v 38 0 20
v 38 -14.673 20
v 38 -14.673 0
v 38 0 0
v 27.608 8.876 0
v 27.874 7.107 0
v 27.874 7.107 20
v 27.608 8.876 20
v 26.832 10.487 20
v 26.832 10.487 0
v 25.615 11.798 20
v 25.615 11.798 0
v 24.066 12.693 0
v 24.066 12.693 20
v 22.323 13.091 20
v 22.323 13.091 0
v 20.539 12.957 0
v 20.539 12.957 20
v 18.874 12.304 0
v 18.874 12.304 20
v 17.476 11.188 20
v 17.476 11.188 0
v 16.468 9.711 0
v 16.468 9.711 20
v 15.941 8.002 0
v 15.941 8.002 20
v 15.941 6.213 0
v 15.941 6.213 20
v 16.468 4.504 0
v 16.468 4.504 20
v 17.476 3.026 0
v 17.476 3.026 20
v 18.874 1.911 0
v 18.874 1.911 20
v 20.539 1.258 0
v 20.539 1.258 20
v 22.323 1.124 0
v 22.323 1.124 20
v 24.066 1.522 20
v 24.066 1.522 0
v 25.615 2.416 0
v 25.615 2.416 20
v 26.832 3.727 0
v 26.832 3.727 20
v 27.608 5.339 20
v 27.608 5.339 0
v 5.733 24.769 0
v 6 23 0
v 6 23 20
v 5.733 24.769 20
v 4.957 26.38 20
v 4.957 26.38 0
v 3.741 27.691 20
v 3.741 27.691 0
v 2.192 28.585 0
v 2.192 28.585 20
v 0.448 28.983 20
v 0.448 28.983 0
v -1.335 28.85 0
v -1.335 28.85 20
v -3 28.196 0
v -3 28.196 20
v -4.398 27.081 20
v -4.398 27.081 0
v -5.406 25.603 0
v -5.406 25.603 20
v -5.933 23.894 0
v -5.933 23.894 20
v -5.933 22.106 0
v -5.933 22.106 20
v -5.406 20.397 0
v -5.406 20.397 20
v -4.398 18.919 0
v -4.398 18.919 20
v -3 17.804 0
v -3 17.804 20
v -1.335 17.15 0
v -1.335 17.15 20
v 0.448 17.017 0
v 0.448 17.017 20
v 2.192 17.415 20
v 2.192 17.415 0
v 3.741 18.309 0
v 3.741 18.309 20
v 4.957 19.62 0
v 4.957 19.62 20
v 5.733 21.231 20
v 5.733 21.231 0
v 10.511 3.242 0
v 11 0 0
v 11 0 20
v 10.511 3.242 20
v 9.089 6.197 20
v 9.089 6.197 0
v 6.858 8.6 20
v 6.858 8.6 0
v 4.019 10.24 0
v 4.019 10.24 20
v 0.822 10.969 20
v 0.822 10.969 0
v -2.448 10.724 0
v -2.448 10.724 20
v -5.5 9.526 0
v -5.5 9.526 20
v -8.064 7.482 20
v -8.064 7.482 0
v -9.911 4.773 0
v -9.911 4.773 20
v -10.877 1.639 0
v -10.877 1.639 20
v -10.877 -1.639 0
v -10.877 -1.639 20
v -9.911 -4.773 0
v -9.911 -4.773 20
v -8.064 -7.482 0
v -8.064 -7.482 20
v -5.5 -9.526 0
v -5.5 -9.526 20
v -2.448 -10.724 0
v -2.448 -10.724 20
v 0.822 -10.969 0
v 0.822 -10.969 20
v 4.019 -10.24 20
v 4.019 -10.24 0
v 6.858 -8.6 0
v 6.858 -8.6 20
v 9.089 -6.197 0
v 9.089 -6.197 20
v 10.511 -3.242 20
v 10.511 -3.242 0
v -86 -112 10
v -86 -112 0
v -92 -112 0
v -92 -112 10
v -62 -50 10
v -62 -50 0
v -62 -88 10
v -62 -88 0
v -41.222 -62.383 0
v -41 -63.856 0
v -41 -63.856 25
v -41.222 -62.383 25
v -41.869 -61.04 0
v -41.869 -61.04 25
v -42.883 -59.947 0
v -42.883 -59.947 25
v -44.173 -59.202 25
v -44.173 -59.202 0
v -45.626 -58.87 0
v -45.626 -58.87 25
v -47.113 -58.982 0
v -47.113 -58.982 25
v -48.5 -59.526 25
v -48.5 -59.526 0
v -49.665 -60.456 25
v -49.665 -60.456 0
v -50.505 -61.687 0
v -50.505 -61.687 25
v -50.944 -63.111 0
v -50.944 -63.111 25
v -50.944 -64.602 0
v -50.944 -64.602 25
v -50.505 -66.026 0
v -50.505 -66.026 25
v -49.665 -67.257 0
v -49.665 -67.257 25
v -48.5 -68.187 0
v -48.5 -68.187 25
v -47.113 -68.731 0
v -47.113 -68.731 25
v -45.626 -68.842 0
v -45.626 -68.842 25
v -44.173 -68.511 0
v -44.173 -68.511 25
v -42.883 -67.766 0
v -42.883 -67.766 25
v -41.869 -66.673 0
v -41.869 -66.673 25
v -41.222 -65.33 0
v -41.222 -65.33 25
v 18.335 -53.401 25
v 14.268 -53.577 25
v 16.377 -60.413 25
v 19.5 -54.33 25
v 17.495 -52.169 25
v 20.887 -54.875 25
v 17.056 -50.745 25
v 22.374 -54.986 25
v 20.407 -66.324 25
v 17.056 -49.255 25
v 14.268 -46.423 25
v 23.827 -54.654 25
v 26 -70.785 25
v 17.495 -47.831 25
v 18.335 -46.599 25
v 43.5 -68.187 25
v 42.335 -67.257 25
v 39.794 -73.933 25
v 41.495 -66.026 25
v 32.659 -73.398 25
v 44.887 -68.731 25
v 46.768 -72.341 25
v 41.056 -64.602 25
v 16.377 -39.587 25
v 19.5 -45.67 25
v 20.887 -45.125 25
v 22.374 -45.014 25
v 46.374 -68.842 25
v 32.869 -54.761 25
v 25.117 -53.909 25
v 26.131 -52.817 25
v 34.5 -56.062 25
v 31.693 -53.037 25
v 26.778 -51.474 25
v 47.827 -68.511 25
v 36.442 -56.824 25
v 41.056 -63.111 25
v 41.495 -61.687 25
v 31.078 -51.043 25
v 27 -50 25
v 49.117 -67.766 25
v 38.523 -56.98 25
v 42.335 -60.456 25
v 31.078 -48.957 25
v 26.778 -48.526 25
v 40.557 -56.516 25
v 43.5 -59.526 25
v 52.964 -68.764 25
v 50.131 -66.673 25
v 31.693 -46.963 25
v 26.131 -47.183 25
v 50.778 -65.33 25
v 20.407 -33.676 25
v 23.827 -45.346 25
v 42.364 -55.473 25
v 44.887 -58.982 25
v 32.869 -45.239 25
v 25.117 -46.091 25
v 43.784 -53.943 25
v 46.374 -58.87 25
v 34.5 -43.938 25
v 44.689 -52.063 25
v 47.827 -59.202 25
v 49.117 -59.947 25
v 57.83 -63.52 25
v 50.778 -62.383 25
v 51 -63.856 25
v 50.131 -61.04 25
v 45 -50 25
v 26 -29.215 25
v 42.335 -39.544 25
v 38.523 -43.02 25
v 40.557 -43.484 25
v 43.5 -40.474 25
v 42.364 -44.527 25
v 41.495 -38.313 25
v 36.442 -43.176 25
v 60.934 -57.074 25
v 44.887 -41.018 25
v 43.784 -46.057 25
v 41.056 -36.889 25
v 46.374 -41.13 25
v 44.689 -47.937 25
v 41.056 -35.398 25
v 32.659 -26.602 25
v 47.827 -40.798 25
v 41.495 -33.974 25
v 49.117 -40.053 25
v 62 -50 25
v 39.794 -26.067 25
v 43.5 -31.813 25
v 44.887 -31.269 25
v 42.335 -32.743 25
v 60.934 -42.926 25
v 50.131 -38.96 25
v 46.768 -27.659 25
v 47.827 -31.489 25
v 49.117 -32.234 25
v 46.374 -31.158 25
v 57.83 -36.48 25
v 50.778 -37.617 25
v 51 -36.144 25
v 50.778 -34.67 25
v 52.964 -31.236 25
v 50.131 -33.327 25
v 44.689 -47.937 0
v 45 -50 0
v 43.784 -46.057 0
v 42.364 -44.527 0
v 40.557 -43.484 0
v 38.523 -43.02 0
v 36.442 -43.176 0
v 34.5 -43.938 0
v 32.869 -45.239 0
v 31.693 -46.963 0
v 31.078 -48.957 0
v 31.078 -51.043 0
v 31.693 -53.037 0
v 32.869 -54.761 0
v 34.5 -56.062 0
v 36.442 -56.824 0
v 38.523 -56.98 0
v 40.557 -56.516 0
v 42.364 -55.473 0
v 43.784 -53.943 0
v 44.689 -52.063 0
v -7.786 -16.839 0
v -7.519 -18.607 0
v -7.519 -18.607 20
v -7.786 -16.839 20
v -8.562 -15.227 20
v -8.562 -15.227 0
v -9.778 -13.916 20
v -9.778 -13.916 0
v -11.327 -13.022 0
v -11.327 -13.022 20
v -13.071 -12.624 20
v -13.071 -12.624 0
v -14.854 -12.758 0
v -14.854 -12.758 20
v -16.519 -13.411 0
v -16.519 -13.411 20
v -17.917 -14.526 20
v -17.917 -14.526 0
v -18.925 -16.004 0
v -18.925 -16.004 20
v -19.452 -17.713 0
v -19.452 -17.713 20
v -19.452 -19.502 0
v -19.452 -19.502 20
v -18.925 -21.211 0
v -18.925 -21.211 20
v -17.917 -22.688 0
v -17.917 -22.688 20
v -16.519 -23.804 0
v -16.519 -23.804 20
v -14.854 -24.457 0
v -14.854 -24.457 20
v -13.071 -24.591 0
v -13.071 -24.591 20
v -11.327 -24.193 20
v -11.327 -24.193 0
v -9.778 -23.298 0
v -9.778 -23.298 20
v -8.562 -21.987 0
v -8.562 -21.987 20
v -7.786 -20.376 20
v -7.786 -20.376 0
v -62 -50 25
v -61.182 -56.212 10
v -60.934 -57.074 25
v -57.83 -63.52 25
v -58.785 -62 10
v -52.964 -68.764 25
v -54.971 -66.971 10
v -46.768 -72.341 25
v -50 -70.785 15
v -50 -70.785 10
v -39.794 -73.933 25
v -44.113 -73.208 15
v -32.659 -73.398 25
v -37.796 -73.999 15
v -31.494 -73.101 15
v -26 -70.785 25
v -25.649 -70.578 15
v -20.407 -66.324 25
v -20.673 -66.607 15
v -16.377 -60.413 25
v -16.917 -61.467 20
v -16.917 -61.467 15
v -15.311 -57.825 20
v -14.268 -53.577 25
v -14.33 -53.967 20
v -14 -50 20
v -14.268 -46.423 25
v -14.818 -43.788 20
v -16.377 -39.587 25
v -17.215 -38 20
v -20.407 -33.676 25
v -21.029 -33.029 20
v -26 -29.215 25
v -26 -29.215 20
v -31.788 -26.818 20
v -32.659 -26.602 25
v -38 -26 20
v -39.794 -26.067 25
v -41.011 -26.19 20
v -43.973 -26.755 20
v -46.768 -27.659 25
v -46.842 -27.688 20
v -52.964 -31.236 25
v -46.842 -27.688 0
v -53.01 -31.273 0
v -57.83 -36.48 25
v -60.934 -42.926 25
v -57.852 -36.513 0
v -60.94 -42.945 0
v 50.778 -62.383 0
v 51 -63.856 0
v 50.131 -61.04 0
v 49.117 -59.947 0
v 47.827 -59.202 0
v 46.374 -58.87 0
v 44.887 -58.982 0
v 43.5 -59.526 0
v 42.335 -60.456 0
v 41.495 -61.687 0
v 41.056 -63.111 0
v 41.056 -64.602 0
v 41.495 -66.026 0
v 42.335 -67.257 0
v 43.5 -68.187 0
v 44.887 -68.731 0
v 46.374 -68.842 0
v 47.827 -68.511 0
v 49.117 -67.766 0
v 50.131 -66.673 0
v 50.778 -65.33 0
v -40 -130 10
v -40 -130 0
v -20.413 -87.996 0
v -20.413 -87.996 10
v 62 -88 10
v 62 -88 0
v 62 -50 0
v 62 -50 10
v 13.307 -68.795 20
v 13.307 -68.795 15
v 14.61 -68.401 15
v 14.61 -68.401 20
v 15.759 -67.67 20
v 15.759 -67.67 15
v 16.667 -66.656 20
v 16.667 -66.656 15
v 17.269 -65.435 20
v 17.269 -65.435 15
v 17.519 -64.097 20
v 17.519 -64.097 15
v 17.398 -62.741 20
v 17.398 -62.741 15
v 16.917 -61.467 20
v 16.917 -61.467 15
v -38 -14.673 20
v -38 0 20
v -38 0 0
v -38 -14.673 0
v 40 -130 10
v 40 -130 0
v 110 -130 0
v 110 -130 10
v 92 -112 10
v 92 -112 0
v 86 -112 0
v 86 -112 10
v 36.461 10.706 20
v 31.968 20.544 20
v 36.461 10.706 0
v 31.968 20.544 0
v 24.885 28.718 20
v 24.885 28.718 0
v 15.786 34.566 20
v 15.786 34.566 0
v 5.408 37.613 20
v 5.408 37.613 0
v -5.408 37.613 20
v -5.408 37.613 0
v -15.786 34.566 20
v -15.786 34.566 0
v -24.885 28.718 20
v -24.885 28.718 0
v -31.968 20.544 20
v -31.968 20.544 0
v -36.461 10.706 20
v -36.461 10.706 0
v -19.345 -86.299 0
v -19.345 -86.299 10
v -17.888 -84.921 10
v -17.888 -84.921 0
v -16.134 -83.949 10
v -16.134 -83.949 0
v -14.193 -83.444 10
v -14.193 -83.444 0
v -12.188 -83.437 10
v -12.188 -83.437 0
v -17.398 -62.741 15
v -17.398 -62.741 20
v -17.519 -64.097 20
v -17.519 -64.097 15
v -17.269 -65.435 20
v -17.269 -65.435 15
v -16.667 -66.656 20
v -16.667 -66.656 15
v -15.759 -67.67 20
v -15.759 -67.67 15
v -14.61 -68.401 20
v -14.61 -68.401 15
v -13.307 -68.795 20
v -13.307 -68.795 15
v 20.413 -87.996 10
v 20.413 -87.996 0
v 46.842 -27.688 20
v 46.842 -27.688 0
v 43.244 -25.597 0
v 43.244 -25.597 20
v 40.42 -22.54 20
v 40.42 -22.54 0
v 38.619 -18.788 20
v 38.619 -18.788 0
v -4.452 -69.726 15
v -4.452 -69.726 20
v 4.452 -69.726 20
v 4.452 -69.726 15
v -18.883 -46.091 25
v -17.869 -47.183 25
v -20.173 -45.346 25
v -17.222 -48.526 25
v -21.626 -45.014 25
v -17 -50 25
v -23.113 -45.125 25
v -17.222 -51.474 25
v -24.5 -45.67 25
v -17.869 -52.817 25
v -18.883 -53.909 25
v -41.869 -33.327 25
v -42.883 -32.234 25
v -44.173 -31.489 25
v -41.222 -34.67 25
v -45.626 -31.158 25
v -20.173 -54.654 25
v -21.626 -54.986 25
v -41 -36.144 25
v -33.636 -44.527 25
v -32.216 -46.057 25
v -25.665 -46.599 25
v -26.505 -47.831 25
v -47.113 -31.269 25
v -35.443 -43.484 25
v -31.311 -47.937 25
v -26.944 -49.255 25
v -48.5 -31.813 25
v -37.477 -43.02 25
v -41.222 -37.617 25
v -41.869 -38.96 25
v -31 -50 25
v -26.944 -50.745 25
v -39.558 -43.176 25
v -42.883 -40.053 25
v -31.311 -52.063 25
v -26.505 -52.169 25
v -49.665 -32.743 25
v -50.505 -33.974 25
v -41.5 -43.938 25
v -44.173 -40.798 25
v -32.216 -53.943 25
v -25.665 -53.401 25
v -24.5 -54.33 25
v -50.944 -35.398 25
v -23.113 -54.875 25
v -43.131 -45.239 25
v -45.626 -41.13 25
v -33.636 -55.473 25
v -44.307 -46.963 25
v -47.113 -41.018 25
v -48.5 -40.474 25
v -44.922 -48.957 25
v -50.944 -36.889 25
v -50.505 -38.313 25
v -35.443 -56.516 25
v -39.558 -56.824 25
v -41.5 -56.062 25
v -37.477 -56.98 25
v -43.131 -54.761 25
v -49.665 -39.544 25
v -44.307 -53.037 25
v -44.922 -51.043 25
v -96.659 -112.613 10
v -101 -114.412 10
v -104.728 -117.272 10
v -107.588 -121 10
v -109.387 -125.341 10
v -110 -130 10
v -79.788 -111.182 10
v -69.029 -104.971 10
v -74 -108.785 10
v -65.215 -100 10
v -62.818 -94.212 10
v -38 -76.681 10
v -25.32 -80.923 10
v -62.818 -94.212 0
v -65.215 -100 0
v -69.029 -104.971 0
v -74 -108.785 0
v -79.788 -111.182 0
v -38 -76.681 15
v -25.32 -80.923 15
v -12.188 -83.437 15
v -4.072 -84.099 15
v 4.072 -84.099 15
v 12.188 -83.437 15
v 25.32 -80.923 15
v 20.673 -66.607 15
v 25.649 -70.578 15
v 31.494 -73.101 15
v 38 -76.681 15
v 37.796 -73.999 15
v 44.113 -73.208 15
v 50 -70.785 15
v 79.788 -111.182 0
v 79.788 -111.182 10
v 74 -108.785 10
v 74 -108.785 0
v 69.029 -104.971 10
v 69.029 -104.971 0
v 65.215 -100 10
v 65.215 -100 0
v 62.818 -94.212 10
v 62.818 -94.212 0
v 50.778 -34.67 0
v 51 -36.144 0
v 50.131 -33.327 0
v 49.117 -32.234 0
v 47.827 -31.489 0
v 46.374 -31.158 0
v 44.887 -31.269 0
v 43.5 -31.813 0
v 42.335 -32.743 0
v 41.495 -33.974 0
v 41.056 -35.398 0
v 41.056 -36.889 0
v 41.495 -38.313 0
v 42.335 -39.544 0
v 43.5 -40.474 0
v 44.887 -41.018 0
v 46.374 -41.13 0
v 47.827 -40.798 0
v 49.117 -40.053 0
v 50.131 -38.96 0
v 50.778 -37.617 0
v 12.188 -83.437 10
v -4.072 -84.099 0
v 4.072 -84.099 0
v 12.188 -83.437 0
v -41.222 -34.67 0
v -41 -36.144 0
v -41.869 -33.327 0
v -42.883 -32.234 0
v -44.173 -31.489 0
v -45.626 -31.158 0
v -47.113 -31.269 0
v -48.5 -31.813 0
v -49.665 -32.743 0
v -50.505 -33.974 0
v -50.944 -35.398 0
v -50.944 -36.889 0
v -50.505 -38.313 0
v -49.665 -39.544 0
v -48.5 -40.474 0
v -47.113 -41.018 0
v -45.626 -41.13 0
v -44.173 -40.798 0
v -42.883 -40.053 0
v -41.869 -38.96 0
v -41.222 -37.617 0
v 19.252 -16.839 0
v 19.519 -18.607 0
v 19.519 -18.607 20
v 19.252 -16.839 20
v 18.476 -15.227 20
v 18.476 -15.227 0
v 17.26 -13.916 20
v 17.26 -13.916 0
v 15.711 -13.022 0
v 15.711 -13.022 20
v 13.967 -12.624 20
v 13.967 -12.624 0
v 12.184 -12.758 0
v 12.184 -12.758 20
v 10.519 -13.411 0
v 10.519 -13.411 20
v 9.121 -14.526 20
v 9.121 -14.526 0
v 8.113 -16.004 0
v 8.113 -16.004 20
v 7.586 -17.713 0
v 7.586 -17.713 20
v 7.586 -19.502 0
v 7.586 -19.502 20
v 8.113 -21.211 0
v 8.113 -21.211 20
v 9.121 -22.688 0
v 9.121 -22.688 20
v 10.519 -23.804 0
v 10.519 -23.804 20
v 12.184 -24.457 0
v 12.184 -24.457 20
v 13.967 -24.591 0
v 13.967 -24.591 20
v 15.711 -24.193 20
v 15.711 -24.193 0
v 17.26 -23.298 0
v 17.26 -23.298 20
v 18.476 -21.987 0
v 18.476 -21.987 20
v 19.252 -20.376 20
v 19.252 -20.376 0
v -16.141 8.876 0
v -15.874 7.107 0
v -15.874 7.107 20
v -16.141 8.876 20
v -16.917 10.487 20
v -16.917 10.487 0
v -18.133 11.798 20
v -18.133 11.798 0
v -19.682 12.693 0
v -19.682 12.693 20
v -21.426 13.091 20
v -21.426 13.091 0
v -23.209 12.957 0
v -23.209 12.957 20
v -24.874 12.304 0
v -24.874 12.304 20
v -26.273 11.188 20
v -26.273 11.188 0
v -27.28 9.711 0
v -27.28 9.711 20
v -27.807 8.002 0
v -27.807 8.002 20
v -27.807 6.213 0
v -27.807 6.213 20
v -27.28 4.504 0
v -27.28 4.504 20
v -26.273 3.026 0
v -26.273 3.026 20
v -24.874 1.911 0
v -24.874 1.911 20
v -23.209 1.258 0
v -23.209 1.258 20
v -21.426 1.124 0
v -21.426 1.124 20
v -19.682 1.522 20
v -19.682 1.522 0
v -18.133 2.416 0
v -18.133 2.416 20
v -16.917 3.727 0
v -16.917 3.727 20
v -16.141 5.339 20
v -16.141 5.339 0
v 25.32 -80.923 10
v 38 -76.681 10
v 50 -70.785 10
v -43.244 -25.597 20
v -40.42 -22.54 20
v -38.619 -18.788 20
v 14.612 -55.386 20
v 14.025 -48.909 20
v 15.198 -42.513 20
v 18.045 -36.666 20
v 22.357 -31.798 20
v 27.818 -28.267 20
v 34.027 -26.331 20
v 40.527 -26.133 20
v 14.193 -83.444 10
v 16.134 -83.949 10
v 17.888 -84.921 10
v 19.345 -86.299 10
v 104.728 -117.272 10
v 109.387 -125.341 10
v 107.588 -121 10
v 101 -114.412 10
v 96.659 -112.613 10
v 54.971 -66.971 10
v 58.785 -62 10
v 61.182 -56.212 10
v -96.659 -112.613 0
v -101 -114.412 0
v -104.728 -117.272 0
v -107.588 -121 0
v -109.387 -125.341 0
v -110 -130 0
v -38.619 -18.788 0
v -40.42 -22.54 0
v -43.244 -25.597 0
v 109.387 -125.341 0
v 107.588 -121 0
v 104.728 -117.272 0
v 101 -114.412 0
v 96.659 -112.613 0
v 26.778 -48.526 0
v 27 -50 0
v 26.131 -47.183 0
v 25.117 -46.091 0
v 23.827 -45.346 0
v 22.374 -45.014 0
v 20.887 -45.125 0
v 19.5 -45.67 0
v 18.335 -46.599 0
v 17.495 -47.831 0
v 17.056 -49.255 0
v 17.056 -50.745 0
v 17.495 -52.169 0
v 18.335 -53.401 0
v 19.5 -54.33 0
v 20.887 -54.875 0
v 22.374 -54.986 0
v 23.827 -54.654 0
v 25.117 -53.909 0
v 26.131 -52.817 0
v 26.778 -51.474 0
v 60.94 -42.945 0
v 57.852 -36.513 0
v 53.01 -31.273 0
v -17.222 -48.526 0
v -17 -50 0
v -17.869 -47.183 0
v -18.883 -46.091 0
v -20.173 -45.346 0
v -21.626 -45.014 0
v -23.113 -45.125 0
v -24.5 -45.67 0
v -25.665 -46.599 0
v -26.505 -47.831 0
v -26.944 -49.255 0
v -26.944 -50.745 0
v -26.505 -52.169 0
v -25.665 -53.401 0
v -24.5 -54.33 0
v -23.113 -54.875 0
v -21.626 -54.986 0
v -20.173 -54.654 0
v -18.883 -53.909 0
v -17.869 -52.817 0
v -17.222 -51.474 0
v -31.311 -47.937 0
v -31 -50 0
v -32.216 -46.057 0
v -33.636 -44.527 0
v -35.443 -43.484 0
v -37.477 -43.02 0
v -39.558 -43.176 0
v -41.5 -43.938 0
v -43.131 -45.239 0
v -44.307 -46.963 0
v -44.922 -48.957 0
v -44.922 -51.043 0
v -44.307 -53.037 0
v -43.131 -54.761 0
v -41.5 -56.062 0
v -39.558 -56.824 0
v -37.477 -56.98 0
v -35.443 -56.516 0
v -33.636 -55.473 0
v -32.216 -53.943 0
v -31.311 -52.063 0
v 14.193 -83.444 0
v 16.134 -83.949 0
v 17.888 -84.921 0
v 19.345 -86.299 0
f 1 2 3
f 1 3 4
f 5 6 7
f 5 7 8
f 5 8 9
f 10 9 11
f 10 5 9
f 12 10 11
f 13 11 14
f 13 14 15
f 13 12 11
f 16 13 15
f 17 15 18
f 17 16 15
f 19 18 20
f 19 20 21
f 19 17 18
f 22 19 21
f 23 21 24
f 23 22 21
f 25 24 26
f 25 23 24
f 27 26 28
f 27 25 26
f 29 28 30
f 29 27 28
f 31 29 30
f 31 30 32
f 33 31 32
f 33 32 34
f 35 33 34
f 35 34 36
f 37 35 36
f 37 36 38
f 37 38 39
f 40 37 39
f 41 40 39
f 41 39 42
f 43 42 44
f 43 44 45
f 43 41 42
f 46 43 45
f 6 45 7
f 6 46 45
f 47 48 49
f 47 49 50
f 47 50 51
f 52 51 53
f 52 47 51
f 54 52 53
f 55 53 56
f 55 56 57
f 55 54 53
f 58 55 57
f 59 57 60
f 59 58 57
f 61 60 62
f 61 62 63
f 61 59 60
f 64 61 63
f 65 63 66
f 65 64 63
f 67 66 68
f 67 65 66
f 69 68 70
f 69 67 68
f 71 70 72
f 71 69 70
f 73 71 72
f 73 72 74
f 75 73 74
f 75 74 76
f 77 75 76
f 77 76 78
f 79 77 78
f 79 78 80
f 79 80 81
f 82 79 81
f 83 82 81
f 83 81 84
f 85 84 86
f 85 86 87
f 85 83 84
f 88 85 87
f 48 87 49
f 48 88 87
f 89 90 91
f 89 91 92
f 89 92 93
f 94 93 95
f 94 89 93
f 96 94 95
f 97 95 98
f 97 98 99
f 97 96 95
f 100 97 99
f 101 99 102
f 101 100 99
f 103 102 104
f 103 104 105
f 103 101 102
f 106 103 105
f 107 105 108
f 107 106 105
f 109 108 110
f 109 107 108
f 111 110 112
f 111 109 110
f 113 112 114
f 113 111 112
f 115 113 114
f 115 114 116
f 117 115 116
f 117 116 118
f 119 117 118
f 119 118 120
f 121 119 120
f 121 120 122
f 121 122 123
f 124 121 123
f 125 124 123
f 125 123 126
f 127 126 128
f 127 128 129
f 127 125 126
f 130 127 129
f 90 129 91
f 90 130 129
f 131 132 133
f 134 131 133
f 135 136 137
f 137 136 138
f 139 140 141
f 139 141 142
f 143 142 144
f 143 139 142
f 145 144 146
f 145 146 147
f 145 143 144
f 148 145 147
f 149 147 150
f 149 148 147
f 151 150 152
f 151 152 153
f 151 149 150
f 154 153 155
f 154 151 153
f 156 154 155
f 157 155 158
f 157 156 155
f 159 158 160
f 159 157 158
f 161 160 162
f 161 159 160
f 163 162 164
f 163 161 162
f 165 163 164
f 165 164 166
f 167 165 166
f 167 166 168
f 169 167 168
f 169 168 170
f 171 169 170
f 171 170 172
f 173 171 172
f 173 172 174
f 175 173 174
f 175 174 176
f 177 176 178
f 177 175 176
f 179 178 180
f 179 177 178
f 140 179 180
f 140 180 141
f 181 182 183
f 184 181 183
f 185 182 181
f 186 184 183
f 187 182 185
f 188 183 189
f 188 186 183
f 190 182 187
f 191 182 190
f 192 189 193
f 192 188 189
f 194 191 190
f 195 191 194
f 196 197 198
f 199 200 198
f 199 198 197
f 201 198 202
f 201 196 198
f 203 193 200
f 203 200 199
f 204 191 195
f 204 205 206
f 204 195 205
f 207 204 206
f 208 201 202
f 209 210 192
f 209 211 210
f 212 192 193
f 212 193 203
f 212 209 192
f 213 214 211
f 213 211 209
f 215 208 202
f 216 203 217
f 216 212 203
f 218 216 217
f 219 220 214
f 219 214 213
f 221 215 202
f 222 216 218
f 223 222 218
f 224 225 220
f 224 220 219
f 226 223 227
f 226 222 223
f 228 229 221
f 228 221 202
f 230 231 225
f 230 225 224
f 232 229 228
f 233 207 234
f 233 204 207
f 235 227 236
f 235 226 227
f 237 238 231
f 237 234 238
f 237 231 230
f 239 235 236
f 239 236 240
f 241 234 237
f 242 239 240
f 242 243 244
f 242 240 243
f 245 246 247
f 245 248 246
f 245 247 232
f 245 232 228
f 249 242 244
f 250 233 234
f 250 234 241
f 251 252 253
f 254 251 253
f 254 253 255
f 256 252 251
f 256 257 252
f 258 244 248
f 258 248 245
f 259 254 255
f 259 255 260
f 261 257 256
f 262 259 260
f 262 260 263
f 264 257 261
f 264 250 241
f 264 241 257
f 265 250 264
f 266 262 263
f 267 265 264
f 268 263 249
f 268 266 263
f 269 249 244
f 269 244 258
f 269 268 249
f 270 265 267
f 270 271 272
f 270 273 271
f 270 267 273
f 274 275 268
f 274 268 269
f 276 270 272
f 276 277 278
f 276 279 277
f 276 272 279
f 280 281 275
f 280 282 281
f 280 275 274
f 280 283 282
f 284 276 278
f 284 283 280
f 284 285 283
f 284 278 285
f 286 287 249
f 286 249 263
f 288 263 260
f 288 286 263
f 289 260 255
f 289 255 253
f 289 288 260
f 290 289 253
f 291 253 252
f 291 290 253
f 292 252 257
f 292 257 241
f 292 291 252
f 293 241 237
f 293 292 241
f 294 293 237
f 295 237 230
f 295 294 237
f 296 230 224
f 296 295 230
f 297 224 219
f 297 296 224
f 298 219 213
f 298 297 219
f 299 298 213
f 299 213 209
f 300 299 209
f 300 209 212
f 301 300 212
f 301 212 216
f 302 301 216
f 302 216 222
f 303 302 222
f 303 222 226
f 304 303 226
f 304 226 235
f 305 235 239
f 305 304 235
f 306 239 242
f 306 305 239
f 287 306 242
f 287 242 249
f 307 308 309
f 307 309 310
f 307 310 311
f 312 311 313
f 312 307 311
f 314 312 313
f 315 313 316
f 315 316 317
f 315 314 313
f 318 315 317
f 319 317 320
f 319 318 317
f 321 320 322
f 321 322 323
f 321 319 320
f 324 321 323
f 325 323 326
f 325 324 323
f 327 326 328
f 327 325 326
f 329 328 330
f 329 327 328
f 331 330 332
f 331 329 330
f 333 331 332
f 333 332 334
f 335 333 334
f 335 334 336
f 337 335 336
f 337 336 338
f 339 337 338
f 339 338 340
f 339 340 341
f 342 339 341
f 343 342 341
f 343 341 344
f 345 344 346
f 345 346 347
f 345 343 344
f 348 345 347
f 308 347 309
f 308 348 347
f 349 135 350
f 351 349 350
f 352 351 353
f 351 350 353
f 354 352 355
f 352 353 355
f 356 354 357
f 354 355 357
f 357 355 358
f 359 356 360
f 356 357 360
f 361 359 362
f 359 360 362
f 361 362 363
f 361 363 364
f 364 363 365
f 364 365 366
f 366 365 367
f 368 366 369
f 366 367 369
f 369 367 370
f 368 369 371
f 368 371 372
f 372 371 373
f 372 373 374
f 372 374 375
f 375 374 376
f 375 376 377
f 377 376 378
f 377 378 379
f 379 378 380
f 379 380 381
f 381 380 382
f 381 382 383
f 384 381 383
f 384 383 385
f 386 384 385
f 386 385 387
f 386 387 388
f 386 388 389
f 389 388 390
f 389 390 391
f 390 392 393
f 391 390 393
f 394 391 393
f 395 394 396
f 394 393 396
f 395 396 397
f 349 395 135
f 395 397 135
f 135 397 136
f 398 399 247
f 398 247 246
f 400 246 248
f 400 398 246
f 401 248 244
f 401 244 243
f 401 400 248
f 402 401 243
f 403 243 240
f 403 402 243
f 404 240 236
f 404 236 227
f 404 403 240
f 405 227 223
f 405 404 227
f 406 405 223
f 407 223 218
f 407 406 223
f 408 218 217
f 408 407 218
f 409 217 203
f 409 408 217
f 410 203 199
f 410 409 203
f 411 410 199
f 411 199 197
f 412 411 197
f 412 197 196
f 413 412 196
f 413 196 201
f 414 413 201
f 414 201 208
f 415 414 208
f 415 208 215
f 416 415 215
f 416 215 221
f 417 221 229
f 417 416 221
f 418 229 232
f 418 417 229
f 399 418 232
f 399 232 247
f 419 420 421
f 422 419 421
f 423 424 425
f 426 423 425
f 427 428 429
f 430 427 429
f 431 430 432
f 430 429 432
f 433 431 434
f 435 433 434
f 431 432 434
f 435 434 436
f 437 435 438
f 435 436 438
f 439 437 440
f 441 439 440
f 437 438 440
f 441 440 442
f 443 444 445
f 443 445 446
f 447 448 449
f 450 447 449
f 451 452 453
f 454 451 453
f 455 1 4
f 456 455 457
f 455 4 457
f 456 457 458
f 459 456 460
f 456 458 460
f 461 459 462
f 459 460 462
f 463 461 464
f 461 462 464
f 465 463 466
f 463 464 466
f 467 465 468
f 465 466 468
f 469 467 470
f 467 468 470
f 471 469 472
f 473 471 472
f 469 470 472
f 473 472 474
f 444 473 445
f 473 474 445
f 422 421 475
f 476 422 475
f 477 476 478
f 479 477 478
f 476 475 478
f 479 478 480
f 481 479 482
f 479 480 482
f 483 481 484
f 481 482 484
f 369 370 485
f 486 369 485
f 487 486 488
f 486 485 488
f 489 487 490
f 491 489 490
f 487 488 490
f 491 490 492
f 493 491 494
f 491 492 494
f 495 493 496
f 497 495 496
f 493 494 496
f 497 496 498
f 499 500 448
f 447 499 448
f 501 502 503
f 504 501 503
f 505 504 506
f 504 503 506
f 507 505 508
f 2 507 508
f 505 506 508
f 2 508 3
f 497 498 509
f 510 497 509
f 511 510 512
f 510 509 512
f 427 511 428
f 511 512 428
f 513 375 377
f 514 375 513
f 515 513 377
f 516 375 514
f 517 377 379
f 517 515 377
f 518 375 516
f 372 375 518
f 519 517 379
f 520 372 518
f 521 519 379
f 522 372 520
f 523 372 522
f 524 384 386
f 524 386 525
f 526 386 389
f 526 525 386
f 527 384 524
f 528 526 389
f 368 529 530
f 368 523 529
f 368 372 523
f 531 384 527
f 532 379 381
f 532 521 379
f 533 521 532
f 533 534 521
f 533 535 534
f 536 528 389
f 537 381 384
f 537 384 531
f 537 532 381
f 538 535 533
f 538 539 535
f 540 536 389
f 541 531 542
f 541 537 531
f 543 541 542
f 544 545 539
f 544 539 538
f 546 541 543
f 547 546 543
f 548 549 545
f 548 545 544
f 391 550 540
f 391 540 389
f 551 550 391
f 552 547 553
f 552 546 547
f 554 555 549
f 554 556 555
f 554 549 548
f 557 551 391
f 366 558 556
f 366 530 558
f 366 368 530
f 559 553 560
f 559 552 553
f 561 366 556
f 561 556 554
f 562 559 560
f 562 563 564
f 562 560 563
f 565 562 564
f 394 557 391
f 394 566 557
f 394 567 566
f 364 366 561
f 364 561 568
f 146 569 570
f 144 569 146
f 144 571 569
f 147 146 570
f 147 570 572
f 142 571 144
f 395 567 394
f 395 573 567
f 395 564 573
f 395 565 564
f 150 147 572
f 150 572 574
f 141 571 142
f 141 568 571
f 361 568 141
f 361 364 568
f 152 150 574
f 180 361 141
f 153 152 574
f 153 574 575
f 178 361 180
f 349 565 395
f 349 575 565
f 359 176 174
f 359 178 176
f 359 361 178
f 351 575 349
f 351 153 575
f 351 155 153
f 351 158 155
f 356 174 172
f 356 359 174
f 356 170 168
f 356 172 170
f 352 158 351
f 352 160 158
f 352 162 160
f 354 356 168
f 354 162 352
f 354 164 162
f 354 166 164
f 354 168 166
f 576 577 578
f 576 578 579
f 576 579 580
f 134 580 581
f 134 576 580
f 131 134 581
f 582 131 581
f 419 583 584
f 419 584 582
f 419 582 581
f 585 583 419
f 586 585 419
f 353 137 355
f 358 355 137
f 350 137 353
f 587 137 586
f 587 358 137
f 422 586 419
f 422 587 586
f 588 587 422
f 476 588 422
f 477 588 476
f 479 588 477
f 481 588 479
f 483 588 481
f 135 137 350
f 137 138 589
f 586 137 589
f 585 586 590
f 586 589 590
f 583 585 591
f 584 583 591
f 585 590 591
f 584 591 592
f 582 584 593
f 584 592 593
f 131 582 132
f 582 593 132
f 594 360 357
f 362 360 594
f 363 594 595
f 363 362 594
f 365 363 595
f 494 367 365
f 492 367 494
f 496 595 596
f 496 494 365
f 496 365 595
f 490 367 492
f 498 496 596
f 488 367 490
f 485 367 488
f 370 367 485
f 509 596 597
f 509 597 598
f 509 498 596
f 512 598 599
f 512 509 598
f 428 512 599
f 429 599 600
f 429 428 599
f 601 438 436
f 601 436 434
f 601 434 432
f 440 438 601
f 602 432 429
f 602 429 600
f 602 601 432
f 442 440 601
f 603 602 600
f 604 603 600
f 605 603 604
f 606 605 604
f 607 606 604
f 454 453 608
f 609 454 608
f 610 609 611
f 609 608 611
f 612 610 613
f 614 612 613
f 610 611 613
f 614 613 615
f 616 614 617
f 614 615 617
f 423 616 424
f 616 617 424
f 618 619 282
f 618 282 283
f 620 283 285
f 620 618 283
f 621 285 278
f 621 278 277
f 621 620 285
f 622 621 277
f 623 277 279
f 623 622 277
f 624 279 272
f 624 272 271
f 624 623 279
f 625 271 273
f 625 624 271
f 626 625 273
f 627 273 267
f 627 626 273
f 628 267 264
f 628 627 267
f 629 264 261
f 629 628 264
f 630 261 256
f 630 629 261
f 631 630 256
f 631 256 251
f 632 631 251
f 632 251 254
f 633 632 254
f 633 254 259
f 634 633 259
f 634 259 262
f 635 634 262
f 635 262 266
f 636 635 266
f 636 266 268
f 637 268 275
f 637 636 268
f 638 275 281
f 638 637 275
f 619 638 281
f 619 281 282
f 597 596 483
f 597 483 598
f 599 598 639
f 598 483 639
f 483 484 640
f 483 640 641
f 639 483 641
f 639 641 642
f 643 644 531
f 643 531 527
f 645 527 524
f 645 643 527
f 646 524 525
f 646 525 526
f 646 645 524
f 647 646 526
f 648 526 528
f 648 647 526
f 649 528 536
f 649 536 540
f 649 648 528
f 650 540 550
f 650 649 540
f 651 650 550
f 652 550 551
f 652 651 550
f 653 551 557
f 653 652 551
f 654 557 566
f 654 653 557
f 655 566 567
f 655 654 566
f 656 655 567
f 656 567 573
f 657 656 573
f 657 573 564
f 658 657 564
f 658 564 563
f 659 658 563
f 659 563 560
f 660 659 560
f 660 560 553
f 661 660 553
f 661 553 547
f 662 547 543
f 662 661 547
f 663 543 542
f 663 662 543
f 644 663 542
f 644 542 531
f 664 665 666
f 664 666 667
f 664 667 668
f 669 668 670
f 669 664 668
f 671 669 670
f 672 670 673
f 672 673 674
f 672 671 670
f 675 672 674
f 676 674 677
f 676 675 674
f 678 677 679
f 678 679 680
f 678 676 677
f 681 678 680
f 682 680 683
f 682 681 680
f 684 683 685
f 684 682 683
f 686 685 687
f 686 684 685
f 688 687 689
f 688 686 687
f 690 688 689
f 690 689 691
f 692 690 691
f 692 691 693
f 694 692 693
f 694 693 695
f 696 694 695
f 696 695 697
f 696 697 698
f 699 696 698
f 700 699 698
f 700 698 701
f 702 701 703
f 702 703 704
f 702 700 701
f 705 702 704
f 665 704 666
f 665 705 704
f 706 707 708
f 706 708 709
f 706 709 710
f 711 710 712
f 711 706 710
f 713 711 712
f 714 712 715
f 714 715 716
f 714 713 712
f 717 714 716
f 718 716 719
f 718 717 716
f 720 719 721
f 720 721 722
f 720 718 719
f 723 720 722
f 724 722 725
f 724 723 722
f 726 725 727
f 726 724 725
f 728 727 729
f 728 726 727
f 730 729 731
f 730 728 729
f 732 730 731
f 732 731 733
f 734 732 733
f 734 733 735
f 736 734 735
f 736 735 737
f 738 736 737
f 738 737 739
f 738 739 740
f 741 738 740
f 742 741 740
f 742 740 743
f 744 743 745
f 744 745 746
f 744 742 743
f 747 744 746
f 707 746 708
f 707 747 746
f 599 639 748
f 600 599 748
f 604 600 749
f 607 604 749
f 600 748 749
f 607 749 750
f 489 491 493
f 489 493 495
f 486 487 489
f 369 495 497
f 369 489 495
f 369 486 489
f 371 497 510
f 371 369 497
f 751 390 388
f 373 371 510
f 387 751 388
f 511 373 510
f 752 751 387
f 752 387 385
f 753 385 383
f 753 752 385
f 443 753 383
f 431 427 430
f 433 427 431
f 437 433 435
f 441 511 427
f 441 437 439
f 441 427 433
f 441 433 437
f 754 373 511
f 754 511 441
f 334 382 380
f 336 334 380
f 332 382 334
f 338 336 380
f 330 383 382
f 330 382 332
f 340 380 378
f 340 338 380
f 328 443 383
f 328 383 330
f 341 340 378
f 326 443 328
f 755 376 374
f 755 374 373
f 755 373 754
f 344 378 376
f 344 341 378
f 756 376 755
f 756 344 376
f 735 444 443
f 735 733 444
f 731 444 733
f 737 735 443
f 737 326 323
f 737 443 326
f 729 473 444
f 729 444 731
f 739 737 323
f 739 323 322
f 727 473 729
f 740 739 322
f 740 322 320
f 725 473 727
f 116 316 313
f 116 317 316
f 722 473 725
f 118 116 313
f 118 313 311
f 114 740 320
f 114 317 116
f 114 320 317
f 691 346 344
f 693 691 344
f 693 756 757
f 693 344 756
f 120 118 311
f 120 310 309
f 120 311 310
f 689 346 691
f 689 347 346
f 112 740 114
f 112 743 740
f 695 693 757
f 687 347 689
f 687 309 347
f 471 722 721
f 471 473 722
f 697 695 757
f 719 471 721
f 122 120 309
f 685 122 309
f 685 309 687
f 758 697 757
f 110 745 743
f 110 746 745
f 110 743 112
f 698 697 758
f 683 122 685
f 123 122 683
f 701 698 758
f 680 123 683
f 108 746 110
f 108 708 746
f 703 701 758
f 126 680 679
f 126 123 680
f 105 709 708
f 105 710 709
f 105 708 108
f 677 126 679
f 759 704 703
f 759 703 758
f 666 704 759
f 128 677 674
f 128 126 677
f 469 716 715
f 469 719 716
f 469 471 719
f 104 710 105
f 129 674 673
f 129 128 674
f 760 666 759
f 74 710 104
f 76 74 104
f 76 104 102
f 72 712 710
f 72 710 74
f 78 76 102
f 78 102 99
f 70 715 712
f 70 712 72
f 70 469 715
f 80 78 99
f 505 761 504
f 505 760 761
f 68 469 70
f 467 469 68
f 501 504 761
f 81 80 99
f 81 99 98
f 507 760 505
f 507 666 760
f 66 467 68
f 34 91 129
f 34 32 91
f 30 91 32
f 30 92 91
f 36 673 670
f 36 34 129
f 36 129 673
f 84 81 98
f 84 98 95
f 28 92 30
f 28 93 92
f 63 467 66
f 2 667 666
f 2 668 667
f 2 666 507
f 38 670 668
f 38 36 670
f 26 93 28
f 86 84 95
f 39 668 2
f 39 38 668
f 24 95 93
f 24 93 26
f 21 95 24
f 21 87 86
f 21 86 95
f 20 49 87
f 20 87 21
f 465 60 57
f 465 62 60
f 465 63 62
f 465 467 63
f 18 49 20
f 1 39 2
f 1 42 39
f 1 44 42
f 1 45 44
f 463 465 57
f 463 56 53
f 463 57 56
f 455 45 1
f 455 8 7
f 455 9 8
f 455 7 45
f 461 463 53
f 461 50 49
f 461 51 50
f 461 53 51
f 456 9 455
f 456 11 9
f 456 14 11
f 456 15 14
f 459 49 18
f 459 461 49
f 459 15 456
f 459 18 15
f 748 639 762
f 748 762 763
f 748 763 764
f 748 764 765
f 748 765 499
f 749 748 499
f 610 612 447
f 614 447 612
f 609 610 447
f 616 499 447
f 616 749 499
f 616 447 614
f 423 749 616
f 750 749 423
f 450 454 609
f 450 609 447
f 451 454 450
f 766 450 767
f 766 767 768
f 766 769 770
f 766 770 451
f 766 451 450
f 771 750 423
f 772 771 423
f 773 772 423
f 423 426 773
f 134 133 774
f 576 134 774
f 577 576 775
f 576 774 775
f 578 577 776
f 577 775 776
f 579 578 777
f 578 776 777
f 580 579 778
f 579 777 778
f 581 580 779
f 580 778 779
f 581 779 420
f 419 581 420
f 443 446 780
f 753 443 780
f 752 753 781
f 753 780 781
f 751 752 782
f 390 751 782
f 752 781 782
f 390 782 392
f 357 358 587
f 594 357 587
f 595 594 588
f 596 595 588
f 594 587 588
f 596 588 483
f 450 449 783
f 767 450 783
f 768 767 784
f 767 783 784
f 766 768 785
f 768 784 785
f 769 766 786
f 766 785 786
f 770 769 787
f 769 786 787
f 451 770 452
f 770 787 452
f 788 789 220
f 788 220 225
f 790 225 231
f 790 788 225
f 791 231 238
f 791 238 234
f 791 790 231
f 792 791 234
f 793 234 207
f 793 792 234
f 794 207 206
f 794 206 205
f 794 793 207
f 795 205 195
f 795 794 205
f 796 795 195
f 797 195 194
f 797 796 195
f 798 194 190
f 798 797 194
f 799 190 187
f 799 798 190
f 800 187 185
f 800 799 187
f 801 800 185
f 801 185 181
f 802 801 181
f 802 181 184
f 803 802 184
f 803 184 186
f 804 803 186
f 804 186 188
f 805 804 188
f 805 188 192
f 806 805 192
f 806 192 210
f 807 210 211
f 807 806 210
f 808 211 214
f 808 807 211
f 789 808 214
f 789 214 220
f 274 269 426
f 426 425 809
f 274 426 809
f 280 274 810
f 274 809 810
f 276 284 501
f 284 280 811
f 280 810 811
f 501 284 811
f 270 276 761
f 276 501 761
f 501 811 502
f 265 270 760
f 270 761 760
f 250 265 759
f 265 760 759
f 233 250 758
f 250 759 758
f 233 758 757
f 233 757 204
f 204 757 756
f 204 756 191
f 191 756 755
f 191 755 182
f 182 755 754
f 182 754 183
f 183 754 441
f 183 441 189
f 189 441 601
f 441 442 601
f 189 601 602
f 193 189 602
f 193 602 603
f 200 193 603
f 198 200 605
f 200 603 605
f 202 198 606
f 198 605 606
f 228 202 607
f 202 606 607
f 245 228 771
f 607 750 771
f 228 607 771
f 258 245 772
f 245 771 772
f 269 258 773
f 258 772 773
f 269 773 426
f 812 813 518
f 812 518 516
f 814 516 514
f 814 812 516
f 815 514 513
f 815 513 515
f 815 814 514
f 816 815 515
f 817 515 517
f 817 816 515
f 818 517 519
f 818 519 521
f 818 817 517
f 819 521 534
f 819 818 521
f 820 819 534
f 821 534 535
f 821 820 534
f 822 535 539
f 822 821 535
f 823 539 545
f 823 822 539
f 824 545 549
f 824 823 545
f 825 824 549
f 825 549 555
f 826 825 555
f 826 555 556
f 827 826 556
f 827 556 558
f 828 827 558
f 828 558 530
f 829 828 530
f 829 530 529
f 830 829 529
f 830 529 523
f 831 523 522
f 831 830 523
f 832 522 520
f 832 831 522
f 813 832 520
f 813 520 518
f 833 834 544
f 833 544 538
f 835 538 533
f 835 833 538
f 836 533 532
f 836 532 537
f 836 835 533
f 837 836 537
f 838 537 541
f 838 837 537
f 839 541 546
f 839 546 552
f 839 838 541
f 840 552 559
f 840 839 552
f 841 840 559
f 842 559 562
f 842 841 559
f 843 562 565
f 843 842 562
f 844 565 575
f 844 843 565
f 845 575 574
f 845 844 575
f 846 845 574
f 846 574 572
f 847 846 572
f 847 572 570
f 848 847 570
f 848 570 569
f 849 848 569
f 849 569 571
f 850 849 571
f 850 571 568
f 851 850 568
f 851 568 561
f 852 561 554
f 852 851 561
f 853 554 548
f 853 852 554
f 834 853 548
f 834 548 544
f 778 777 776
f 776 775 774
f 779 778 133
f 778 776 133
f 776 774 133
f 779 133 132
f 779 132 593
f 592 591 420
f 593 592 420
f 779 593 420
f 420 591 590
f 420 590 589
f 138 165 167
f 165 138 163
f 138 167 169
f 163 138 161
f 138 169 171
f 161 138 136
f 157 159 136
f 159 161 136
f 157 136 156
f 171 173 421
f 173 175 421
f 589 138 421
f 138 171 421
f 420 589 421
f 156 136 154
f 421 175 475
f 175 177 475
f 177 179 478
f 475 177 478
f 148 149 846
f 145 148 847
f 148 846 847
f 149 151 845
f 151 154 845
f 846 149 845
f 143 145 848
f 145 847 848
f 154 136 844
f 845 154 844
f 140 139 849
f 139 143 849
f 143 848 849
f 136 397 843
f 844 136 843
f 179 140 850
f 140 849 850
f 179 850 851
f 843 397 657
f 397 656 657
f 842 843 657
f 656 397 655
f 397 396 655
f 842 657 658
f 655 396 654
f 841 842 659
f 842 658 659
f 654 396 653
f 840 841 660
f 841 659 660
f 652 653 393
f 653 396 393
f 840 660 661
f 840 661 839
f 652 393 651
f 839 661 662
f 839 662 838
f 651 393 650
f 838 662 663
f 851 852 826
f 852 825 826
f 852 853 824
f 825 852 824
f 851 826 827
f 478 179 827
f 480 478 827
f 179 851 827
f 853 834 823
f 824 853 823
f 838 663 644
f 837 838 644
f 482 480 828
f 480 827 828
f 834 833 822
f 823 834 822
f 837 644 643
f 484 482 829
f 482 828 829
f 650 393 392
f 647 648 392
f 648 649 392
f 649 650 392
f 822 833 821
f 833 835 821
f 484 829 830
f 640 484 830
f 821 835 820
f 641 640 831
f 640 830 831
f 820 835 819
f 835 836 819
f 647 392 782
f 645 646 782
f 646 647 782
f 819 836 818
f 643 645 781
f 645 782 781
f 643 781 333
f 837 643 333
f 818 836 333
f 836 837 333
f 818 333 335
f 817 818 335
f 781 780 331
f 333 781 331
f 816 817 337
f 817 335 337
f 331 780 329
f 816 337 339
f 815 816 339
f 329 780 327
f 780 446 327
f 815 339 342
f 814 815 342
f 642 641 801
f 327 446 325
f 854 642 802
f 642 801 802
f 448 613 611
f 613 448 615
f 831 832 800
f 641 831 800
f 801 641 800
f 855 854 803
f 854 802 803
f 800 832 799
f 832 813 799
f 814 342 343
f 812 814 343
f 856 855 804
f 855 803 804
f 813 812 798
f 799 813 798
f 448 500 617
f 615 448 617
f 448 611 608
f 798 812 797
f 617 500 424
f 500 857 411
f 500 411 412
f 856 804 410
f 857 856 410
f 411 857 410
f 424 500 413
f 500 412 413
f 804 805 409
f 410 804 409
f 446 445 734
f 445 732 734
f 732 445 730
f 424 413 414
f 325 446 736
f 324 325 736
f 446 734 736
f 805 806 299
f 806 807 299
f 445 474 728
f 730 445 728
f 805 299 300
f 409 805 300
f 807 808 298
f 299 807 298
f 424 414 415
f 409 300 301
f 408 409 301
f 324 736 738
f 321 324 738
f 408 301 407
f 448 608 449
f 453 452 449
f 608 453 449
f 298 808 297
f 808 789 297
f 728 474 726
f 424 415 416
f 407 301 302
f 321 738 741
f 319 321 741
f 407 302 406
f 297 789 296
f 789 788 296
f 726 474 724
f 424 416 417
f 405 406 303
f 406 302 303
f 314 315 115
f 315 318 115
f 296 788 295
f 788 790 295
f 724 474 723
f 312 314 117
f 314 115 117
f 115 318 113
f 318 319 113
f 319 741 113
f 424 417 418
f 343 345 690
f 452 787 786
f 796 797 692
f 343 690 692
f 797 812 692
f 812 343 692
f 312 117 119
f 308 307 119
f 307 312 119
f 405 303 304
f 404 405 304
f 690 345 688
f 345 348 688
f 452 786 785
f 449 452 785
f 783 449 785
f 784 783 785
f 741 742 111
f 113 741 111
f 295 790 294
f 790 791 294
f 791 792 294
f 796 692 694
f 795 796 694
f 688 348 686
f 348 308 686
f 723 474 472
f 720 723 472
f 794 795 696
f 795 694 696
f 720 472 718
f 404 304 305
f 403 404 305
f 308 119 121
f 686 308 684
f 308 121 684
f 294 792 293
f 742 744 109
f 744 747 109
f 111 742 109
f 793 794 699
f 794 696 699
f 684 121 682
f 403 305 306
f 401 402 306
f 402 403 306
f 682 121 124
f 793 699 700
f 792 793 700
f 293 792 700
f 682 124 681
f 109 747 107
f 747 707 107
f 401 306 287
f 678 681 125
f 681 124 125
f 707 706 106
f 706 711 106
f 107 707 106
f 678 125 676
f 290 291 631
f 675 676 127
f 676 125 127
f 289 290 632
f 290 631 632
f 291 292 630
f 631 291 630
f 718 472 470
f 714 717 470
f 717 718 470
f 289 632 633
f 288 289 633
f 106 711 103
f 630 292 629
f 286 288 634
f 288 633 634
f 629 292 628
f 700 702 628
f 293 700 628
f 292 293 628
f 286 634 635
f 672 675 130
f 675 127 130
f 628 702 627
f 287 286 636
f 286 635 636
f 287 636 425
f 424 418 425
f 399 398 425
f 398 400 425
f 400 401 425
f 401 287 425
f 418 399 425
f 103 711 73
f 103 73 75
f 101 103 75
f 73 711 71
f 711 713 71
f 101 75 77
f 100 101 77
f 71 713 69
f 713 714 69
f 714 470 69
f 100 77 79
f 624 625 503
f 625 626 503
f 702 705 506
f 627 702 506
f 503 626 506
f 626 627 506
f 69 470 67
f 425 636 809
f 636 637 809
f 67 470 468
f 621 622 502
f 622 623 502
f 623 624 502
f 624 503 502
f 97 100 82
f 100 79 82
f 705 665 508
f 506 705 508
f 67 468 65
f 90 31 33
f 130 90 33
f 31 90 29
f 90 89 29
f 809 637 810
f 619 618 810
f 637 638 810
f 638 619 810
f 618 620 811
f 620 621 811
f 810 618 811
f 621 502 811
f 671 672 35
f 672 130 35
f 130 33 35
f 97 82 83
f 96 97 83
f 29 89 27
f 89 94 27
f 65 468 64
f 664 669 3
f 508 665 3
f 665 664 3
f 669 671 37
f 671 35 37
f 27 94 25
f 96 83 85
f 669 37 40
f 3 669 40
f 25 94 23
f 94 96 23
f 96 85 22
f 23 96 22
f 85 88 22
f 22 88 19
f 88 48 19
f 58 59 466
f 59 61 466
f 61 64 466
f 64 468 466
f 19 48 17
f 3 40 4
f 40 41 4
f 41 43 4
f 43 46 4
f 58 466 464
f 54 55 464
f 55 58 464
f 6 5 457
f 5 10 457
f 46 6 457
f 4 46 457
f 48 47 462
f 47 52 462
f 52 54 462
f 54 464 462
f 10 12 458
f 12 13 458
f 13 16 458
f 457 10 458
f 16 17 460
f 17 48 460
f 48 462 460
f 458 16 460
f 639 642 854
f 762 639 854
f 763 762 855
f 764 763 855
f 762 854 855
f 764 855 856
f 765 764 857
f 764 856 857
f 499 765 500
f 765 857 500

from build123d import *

# Parameters (mm, degrees)
EXTRUDE_1_DEPTH   = 10
EXTRUDE_1_2_DEPTH = 10
SKETCH_1_3_R      = 6
SKETCH_1_3_R_2    = 11
EXTRUDE_2_DEPTH   = 20
EXTRUDE_3_DEPTH   = 15
SKETCH_1_5_R      = 24
SKETCH_1_5_R_2    = 5
SKETCH_1_5_R_3    = 7
EXTRUDE_4_DEPTH   = 25


with BuildPart() as part:
    # Эскиз1 → Бобышка-Вытянуть1 (new body)
    with BuildSketch(Plane.XY):
        with BuildLine():
            ThreePointArc((-50, -70.784609691), (-58.784609691, -62), (-62, -50))
            Line((-62, -50), (-62, -88))
            ThreePointArc((-62, -88), (-69.029437252, -104.970562748), (-86, -112))
            Line((-86, -112), (-92, -112))
            ThreePointArc((-92, -112), (-104.727922061, -117.272077939), (-110, -130))
            Line((-110, -130), (-40, -130))
            Line((-40, -130), (-20.413213913, -87.996001687))
            ThreePointArc((-20.413213913, -87.996001687), (-17.041200429, -84.37997452), (-12.187732979, -83.436586413))
            ThreePointArc((-12.187732979, -83.436586413), (-31.730847168, -79.014307175), (-50, -70.784609691))
        make_face()
    extrude(amount=EXTRUDE_1_DEPTH)



with BuildPart() as body_2:
    # Эскиз1 → Extrude 1 2 (new body)
    with BuildSketch(Plane.XY):
        with BuildLine():
            Line((62, -88), (62, -50))
            ThreePointArc((62, -50), (58.784609691, -62), (50, -70.784609691))
            ThreePointArc((50, -70.784609691), (31.730847168, -79.014307175), (12.187732979, -83.436586413))
            ThreePointArc((12.187732979, -83.436586413), (17.041200429, -84.37997452), (20.413213913, -87.996001687))
            Line((20.413213913, -87.996001687), (40, -130))
            Line((40, -130), (110, -130))
            ThreePointArc((110, -130), (104.727922061, -117.272077939), (92, -112))
            Line((92, -112), (86, -112))
            ThreePointArc((86, -112), (69.029437252, -104.970562748), (62, -88))
        make_face()
    extrude(amount=EXTRUDE_1_2_DEPTH)


with BuildPart() as body_3:
    # Эскиз1<3> → Бобышка-Вытянуть2 (new body)
    with BuildSketch(Plane.XY):
        with BuildLine():
            ThreePointArc((38, 0), (0, 38), (-38, 0))
            Line((-38, 0), (-38, -14.672956535))
            ThreePointArc((-38, -14.672956535), (-40.419617314, -22.540277352), (-46.842105263, -27.688183075))
            ThreePointArc((-46.842105263, -27.688183075), (-42.500910674, -26.425823384), (-38, -26))
            ThreePointArc((-38, -26), (-21.029437252, -33.029437252), (-14, -50))
            ThreePointArc((-14, -50), (-14.740639422, -55.916261107), (-16.916845457, -61.467370864))
            ThreePointArc((-16.916845457, -61.467370864), (-17.009837453, -66.065918092), (-13.307304194, -68.794751467))
            ThreePointArc((-13.307304194, -68.794751467), (0, -69.842886359), (13.307304194, -68.794751467))
            ThreePointArc((13.307304194, -68.794751467), (17.009837453, -66.065918092), (16.916845457, -61.467370864))
            ThreePointArc((16.916845457, -61.467370864), (20.035612902, -34.085201974), (46.842105263, -27.688183075))
            ThreePointArc((46.842105263, -27.688183075), (40.419617314, -22.540277352), (38, -14.672956535))
            Line((38, -14.672956535), (38, 0))
        make_face()
        with Locations((-13.519060803, -18.607390871)):
            Circle(SKETCH_1_3_R, mode=Mode.SUBTRACT)
        Circle(SKETCH_1_3_R_2, mode=Mode.SUBTRACT)
        with Locations((-21.874299875, 7.107390871)):
            Circle(SKETCH_1_3_R, mode=Mode.SUBTRACT)
        with Locations((0, 23)):
            Circle(SKETCH_1_3_R, mode=Mode.SUBTRACT)
        with Locations((13.519060803, -18.607390871)):
            Circle(SKETCH_1_3_R, mode=Mode.SUBTRACT)
        with Locations((21.874299875, 7.107390871)):
            Circle(SKETCH_1_3_R, mode=Mode.SUBTRACT)
    extrude(amount=EXTRUDE_2_DEPTH)


with BuildPart() as part_1:
    add(part.part)

    add(body_2.part)  # Бобышка-Вытянуть3 merges body 2

    add(body_3.part)  # Бобышка-Вытянуть3 merges body 3
    # Эскиз1<4> → Бобышка-Вытянуть3 (add)
    with BuildSketch(Plane.XY):
        with BuildLine():
            ThreePointArc((-16.916845457, -61.467370864), (-31.493952125, -73.10132769), (-50, -70.784609691))
            ThreePointArc((-50, -70.784609691), (-31.730847168, -79.014307175), (-12.187732979, -83.436586413))
            ThreePointArc((-12.187732979, -83.436586413), (0, -84.182069312), (12.187732979, -83.436586413))
            ThreePointArc((12.187732979, -83.436586413), (31.730847168, -79.014307175), (50, -70.784609691))
            ThreePointArc((50, -70.784609691), (31.493952125, -73.10132769), (16.916845457, -61.467370864))
            ThreePointArc((16.916845457, -61.467370864), (17.009837453, -66.065918092), (13.307304194, -68.794751467))
            ThreePointArc((13.307304194, -68.794751467), (0, -69.842886359), (-13.307304194, -68.794751467))
            ThreePointArc((-13.307304194, -68.794751467), (-17.009837453, -66.065918092), (-16.916845457, -61.467370864))
        make_face()
    extrude(amount=EXTRUDE_3_DEPTH)

    # Эскиз1<5> → Бобышка-Вытянуть4 (add)
    # profile 1 of 2: a face of its own
    with BuildSketch(Plane.XY):
        with Locations((-38, -50)):
            Circle(SKETCH_1_5_R)
        with Locations((-46, -63.856406461)):
            Circle(SKETCH_1_5_R_2, mode=Mode.SUBTRACT)
        with Locations((-38, -50)):
            Circle(SKETCH_1_5_R_3, mode=Mode.SUBTRACT)
        with Locations((-22, -50)):
            Circle(SKETCH_1_5_R_2, mode=Mode.SUBTRACT)
        with Locations((-46, -36.143593539)):
            Circle(SKETCH_1_5_R_2, mode=Mode.SUBTRACT)
    # profile 2 of 2: a face of its own
    with BuildSketch(Plane.XY):
        with Locations((38, -50)):
            Circle(SKETCH_1_5_R)
        with Locations((22, -50)):
            Circle(SKETCH_1_5_R_2, mode=Mode.SUBTRACT)
        with Locations((46, -63.856406461)):
            Circle(SKETCH_1_5_R_2, mode=Mode.SUBTRACT)
        with Locations((38, -50)):
            Circle(SKETCH_1_5_R_3, mode=Mode.SUBTRACT)
        with Locations((46, -36.143593539)):
            Circle(SKETCH_1_5_R_2, mode=Mode.SUBTRACT)
    extrude(amount=EXTRUDE_4_DEPTH)


solid = part_1.part
